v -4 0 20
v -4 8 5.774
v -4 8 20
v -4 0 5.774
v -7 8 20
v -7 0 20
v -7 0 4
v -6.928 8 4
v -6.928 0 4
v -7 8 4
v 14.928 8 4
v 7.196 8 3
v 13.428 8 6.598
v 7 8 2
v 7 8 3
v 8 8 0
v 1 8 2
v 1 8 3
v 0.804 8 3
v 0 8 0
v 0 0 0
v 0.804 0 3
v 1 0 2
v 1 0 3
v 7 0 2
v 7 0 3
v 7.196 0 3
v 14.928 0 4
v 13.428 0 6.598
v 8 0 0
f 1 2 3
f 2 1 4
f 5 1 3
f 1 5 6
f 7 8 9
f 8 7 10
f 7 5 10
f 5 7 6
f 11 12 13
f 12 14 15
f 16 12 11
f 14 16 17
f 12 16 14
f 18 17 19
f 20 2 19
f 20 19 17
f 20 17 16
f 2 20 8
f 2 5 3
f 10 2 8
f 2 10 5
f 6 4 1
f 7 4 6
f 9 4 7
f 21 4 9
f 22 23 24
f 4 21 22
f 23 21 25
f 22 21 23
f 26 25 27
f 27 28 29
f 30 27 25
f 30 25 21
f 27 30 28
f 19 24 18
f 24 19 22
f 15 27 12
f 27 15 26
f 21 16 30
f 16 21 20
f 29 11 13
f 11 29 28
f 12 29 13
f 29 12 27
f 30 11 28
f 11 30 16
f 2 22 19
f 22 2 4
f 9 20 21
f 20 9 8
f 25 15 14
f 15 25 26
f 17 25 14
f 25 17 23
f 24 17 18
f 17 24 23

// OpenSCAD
difference(){
	union(){
        

        translate([-7,0,4]){
            cube([3,8,16], center=false);
        }         

        translate([0,0,0]){
            cube([8,8,3], center=false);
        }         
        translate([8,0,0]){
            rotate([0,-30,0]){
                cube([8,8,3], center=false);
            }
        }         
        rotate([0,0,180]){
            translate([0,-8,0]){
                rotate([0,-30,0]){
                    cube([8,8,3], center=false);
                }
            }         
        }       
       

          
      

	}
	union() {
        translate([1,-1,2]){
            cube([6,10,3], center=false);
        }  

	}
}
